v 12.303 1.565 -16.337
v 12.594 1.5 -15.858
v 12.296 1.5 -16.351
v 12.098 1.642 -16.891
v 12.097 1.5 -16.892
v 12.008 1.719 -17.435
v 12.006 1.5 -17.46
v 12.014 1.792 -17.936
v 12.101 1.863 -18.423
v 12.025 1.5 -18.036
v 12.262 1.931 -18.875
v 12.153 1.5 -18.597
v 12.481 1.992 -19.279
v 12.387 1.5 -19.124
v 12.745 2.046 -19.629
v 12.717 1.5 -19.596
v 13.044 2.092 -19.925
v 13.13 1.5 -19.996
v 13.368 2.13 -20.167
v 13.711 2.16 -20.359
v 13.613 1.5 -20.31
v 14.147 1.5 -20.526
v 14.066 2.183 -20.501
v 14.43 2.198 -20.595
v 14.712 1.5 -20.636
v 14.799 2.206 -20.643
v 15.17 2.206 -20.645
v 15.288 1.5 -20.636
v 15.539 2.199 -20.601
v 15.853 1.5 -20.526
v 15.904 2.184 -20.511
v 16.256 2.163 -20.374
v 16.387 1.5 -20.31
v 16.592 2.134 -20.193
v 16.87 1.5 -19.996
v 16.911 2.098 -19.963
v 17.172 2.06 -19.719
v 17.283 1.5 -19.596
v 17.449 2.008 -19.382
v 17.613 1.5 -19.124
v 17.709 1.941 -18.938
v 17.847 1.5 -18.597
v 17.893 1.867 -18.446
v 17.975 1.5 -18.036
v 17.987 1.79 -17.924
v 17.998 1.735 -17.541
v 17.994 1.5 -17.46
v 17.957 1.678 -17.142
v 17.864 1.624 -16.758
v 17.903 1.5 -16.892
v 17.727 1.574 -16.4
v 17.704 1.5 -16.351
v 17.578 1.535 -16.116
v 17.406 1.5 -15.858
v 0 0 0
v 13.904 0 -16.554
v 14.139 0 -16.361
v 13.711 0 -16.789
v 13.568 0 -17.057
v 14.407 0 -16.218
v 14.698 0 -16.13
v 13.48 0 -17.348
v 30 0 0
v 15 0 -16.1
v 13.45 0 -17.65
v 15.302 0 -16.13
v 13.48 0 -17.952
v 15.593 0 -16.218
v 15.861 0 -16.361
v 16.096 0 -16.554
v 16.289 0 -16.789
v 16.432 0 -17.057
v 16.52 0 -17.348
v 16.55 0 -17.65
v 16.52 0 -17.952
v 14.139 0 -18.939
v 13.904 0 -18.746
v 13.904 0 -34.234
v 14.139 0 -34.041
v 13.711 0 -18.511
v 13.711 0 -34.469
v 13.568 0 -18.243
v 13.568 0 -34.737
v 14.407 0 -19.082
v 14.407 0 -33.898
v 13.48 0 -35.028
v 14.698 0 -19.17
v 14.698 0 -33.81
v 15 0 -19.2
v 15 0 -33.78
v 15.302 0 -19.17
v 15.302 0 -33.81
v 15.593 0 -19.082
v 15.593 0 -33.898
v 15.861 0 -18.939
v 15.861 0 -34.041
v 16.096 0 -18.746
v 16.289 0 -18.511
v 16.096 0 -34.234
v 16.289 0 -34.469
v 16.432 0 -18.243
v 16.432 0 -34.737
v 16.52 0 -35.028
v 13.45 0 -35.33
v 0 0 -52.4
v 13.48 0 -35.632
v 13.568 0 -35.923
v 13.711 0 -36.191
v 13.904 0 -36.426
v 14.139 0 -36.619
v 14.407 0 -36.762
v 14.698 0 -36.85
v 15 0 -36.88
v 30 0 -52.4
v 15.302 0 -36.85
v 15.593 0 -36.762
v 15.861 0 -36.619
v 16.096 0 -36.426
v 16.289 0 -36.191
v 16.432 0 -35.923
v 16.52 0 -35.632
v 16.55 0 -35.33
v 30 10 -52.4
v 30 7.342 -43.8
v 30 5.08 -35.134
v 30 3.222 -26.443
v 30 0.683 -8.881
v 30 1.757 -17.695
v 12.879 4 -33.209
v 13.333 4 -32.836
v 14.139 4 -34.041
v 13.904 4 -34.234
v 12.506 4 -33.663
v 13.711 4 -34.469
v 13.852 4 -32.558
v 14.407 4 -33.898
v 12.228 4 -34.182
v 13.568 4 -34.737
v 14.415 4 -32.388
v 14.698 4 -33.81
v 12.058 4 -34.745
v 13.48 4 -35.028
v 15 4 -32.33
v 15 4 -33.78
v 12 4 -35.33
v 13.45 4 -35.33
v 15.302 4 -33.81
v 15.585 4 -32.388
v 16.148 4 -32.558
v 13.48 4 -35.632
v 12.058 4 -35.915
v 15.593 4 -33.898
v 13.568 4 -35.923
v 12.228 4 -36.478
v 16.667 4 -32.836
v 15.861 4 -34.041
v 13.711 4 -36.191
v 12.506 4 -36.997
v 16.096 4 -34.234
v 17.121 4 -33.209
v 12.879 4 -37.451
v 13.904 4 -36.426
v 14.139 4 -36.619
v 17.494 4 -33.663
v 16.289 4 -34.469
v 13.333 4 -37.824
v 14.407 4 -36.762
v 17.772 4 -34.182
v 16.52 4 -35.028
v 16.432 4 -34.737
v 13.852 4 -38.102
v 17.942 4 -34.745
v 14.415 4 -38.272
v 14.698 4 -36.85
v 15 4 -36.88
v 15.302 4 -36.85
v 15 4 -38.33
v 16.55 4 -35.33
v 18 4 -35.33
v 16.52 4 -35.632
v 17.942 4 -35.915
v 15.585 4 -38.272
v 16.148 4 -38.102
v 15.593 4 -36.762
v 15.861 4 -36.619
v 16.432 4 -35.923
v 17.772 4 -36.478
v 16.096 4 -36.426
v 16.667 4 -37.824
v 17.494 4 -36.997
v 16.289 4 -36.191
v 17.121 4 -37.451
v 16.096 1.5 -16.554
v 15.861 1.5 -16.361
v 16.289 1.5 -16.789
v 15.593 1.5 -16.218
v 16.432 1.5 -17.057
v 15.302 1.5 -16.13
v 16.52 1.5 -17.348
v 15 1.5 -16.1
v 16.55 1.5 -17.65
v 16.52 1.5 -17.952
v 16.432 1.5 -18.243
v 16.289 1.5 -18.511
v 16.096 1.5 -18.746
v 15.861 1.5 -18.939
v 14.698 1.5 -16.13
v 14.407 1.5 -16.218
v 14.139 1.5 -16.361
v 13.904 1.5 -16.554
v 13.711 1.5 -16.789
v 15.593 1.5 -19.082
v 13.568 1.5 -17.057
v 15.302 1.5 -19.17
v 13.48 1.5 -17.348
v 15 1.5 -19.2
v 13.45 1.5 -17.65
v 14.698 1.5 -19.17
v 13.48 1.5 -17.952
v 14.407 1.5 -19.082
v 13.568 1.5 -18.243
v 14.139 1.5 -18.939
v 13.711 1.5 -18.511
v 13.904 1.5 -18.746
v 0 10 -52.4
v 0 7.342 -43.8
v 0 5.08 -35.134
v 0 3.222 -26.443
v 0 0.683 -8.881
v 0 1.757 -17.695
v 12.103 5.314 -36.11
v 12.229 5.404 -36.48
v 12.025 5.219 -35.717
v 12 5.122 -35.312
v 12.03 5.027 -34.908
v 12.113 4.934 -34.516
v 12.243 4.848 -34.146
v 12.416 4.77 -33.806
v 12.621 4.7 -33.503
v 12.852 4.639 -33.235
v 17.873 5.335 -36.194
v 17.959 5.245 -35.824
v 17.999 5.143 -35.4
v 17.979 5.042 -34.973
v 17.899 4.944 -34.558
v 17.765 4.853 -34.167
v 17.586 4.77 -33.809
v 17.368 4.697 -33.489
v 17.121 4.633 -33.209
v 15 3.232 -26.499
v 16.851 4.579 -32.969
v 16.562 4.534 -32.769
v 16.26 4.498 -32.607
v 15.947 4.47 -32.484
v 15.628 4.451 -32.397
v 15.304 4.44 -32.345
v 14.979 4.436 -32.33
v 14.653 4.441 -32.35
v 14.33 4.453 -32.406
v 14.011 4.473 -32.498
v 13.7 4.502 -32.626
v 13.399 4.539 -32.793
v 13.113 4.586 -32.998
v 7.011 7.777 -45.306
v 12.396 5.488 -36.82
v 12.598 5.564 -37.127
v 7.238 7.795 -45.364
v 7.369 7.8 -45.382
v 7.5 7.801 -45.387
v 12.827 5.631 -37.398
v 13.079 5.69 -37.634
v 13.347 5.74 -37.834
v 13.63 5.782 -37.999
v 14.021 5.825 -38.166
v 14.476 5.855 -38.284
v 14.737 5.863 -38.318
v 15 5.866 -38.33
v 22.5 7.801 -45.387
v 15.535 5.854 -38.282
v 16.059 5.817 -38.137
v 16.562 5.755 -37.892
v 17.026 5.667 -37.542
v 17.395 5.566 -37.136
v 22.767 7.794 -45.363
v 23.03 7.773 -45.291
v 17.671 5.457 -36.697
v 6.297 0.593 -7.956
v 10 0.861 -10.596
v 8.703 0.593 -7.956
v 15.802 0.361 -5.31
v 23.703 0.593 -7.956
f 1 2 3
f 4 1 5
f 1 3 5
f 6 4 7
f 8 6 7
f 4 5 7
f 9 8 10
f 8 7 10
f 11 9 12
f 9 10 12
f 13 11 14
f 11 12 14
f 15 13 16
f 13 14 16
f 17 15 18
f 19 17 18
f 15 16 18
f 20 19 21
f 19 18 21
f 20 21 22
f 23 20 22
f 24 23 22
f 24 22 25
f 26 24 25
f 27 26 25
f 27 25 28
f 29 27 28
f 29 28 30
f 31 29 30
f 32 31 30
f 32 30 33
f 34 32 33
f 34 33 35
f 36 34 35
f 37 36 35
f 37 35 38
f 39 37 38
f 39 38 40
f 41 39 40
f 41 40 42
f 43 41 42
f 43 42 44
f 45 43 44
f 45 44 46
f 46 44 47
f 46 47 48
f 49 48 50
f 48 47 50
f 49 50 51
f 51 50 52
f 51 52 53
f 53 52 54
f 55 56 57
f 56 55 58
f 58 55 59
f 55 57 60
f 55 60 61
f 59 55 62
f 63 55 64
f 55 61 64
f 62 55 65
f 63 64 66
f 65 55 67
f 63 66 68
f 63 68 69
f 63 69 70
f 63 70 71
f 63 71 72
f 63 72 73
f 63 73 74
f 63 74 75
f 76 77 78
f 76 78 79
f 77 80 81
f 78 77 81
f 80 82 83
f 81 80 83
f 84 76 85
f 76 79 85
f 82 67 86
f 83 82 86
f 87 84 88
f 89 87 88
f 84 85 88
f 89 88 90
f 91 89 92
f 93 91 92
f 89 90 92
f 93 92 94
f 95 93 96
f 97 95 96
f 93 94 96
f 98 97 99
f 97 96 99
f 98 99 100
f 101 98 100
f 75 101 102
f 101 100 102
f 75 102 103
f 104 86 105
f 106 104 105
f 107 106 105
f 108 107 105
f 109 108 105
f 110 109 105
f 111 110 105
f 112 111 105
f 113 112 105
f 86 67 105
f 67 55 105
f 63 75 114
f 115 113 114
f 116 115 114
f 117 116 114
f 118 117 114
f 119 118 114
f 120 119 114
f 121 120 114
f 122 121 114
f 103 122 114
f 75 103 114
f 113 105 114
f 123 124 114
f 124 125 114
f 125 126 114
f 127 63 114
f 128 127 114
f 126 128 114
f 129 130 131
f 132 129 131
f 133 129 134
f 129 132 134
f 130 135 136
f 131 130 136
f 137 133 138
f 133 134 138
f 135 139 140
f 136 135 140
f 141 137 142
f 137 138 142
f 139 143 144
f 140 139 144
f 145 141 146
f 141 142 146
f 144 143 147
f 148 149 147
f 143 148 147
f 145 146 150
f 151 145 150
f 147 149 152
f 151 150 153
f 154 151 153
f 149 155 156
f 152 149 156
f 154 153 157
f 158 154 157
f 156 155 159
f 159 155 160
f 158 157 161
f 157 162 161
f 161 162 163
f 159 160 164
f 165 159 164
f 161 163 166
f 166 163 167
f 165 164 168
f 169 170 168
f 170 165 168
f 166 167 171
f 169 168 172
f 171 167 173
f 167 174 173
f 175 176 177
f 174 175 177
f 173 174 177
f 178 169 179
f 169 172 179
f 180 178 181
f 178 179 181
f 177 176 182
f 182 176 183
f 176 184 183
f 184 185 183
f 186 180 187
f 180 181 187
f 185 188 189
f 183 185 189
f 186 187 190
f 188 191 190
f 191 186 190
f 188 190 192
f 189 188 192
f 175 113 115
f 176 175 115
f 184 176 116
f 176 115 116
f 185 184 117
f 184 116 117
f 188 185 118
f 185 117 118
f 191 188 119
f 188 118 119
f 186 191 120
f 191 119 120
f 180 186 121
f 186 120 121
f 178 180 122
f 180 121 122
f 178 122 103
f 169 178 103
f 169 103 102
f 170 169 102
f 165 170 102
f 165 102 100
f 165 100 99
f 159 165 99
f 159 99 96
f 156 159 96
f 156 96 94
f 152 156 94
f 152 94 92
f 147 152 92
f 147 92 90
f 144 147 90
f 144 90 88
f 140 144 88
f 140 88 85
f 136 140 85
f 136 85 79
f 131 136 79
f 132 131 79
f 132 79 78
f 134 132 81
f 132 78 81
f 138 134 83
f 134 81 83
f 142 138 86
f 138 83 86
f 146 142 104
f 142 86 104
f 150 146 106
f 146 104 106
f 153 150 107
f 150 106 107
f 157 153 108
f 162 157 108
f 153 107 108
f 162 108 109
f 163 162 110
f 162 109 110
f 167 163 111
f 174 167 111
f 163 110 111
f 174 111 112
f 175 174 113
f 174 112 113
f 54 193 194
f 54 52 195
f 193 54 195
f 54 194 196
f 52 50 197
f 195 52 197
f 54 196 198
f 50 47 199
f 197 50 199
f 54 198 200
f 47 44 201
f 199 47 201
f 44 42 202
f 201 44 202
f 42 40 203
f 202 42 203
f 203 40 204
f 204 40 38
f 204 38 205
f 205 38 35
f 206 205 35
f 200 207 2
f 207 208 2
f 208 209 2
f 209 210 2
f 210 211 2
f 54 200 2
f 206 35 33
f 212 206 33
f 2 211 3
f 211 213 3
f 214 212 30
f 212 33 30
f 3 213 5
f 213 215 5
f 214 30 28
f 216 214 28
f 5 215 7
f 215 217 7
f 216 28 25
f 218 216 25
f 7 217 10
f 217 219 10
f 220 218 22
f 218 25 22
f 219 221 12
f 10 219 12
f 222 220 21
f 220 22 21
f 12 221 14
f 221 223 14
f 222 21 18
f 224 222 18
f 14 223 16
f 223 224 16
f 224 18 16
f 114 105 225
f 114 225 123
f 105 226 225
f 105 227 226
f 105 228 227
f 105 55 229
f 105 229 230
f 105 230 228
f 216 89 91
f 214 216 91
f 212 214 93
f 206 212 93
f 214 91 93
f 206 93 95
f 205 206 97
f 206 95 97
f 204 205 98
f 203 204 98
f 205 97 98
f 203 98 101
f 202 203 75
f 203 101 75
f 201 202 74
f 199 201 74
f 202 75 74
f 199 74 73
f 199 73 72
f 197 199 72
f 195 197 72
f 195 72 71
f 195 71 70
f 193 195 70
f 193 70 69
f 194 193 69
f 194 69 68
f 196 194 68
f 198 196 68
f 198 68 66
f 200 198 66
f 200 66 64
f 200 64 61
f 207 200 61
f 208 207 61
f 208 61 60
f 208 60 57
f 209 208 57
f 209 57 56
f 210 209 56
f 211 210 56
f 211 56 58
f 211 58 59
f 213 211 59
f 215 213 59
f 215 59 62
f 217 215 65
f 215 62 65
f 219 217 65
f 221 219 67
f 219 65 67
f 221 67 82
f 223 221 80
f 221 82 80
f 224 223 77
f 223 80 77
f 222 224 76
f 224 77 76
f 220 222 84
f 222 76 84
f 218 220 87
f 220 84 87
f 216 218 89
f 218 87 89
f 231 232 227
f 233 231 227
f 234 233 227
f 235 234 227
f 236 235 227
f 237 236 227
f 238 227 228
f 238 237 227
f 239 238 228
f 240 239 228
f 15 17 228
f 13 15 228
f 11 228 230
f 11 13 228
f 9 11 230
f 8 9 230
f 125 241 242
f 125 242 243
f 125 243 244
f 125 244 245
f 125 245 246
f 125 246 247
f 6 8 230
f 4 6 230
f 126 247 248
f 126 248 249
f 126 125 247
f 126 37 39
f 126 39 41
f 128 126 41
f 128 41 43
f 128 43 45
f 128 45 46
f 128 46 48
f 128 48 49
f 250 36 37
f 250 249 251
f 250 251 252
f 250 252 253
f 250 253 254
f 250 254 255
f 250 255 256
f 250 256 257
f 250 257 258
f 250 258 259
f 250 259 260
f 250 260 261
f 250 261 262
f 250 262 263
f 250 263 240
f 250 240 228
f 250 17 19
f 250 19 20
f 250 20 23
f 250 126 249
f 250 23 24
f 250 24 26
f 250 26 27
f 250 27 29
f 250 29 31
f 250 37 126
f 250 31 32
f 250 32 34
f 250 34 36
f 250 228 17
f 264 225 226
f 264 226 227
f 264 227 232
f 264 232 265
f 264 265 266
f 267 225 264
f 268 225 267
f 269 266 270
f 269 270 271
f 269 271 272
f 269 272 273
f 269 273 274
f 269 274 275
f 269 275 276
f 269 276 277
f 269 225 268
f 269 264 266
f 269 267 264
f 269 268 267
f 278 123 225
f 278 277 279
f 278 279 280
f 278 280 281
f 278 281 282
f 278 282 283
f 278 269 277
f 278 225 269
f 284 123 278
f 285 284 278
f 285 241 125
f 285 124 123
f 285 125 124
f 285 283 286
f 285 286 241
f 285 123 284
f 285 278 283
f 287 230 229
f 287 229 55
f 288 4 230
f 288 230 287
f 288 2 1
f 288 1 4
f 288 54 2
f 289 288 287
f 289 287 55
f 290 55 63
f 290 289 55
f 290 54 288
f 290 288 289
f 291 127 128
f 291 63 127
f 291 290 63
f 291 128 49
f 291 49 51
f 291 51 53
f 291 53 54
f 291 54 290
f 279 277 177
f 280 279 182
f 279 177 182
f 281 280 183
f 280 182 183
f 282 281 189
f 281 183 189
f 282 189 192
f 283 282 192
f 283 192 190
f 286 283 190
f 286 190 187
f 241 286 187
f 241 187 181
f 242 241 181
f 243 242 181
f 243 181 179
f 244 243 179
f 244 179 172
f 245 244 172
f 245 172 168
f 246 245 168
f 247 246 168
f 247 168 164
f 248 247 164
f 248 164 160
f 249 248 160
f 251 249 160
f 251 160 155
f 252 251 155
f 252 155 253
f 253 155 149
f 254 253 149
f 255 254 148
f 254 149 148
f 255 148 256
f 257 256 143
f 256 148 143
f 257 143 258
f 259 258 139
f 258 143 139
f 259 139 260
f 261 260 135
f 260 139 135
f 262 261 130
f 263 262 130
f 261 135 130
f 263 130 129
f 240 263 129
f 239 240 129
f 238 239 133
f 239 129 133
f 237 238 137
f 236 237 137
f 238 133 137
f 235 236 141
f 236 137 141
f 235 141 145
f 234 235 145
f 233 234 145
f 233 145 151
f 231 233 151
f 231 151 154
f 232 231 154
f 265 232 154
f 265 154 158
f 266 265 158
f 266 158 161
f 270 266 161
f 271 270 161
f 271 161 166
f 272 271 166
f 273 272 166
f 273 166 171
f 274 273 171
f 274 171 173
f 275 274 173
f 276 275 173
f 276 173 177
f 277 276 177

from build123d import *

# Parameters (mm, degrees)
SKETCH1_W           = 30
SKETCH1_H           = 52.4
BOSS_EXTRUDE1_DEPTH = 10
CUT_EXTRUDE1_DEPTH  = 30
SKETCH3_R           = 1.55
CUT_EXTRUDE2_DEPTH  = 14
CUT_EXTRUDE3_START  = -4
SKETCH3_4_R         = 3
SKETCH3_4_R_2       = 1.55
CUT_EXTRUDE3_DEPTH  = 12
CUT_EXTRUDE4_START  = -1.5
SKETCH3_7_R         = 3
SKETCH3_7_R_2       = 1.55
CUT_EXTRUDE4_DEPTH  = 60.702614474


with BuildPart() as part:
    # Sketch1 → Boss-Extrude1 (new body)
    with BuildSketch(Plane(origin=(0, 0, 0), x_dir=(1, 0, 0), z_dir=(0, 1, 0))):
        with Locations((15, 26.2)):
            Rectangle(SKETCH1_W, SKETCH1_H)
    extrude(amount=BOSS_EXTRUDE1_DEPTH)

    # Sketch2 → Cut-Extrude1 (cut)
    with BuildSketch(Plane(origin=(30, 0, 0), x_dir=(0, 0, -1), z_dir=(1, 0, 0))):
        with BuildLine():
            Line((52.4, 10), (0, 10))
            Line((0, 10), (0, 0))
            add(Edge.make_bspline(
                [(52.4, 10), (26.797572393, 1.464832173), (0, 0)],
                knots=[0, 0, 0, 1, 1, 1], degree=2))
        make_face()
    extrude(amount=-CUT_EXTRUDE1_DEPTH, mode=Mode.SUBTRACT)

    # Sketch3 → Cut-Extrude2 (cut)
    with BuildSketch(Plane(origin=(0, 0, 0), x_dir=(-1, 0, 0), z_dir=(0, -1, 0))):
        with Locations((-15, 35.33)):
            Circle(SKETCH3_R)
        with Locations((-15, 17.65)):
            Circle(SKETCH3_R)
    extrude(amount=-CUT_EXTRUDE2_DEPTH, mode=Mode.SUBTRACT)

    # Sketch3<4> → Cut-Extrude3 (cut)
    with BuildSketch(Plane(origin=(0, 0, 0), x_dir=(-1, 0, 0), z_dir=(0, -1, 0)).offset(CUT_EXTRUDE3_START)):
        with Locations((-15, 35.33)):
            Circle(SKETCH3_4_R)
        with Locations((-15, 35.33)):
            Circle(SKETCH3_4_R_2, mode=Mode.SUBTRACT)
    extrude(amount=-CUT_EXTRUDE3_DEPTH, mode=Mode.SUBTRACT)

    # Sketch3<7> → Cut-Extrude4 (cut, through all)
    with BuildSketch(Plane(origin=(0, 0, 0), x_dir=(-1, 0, 0), z_dir=(0, -1, 0)).offset(CUT_EXTRUDE4_START)):
        with Locations((-15, 17.65)):
            Circle(SKETCH3_7_R)
        with Locations((-15, 17.65)):
            Circle(SKETCH3_7_R_2, mode=Mode.SUBTRACT)
    extrude(amount=-CUT_EXTRUDE4_DEPTH, mode=Mode.SUBTRACT)


solid = part.part
